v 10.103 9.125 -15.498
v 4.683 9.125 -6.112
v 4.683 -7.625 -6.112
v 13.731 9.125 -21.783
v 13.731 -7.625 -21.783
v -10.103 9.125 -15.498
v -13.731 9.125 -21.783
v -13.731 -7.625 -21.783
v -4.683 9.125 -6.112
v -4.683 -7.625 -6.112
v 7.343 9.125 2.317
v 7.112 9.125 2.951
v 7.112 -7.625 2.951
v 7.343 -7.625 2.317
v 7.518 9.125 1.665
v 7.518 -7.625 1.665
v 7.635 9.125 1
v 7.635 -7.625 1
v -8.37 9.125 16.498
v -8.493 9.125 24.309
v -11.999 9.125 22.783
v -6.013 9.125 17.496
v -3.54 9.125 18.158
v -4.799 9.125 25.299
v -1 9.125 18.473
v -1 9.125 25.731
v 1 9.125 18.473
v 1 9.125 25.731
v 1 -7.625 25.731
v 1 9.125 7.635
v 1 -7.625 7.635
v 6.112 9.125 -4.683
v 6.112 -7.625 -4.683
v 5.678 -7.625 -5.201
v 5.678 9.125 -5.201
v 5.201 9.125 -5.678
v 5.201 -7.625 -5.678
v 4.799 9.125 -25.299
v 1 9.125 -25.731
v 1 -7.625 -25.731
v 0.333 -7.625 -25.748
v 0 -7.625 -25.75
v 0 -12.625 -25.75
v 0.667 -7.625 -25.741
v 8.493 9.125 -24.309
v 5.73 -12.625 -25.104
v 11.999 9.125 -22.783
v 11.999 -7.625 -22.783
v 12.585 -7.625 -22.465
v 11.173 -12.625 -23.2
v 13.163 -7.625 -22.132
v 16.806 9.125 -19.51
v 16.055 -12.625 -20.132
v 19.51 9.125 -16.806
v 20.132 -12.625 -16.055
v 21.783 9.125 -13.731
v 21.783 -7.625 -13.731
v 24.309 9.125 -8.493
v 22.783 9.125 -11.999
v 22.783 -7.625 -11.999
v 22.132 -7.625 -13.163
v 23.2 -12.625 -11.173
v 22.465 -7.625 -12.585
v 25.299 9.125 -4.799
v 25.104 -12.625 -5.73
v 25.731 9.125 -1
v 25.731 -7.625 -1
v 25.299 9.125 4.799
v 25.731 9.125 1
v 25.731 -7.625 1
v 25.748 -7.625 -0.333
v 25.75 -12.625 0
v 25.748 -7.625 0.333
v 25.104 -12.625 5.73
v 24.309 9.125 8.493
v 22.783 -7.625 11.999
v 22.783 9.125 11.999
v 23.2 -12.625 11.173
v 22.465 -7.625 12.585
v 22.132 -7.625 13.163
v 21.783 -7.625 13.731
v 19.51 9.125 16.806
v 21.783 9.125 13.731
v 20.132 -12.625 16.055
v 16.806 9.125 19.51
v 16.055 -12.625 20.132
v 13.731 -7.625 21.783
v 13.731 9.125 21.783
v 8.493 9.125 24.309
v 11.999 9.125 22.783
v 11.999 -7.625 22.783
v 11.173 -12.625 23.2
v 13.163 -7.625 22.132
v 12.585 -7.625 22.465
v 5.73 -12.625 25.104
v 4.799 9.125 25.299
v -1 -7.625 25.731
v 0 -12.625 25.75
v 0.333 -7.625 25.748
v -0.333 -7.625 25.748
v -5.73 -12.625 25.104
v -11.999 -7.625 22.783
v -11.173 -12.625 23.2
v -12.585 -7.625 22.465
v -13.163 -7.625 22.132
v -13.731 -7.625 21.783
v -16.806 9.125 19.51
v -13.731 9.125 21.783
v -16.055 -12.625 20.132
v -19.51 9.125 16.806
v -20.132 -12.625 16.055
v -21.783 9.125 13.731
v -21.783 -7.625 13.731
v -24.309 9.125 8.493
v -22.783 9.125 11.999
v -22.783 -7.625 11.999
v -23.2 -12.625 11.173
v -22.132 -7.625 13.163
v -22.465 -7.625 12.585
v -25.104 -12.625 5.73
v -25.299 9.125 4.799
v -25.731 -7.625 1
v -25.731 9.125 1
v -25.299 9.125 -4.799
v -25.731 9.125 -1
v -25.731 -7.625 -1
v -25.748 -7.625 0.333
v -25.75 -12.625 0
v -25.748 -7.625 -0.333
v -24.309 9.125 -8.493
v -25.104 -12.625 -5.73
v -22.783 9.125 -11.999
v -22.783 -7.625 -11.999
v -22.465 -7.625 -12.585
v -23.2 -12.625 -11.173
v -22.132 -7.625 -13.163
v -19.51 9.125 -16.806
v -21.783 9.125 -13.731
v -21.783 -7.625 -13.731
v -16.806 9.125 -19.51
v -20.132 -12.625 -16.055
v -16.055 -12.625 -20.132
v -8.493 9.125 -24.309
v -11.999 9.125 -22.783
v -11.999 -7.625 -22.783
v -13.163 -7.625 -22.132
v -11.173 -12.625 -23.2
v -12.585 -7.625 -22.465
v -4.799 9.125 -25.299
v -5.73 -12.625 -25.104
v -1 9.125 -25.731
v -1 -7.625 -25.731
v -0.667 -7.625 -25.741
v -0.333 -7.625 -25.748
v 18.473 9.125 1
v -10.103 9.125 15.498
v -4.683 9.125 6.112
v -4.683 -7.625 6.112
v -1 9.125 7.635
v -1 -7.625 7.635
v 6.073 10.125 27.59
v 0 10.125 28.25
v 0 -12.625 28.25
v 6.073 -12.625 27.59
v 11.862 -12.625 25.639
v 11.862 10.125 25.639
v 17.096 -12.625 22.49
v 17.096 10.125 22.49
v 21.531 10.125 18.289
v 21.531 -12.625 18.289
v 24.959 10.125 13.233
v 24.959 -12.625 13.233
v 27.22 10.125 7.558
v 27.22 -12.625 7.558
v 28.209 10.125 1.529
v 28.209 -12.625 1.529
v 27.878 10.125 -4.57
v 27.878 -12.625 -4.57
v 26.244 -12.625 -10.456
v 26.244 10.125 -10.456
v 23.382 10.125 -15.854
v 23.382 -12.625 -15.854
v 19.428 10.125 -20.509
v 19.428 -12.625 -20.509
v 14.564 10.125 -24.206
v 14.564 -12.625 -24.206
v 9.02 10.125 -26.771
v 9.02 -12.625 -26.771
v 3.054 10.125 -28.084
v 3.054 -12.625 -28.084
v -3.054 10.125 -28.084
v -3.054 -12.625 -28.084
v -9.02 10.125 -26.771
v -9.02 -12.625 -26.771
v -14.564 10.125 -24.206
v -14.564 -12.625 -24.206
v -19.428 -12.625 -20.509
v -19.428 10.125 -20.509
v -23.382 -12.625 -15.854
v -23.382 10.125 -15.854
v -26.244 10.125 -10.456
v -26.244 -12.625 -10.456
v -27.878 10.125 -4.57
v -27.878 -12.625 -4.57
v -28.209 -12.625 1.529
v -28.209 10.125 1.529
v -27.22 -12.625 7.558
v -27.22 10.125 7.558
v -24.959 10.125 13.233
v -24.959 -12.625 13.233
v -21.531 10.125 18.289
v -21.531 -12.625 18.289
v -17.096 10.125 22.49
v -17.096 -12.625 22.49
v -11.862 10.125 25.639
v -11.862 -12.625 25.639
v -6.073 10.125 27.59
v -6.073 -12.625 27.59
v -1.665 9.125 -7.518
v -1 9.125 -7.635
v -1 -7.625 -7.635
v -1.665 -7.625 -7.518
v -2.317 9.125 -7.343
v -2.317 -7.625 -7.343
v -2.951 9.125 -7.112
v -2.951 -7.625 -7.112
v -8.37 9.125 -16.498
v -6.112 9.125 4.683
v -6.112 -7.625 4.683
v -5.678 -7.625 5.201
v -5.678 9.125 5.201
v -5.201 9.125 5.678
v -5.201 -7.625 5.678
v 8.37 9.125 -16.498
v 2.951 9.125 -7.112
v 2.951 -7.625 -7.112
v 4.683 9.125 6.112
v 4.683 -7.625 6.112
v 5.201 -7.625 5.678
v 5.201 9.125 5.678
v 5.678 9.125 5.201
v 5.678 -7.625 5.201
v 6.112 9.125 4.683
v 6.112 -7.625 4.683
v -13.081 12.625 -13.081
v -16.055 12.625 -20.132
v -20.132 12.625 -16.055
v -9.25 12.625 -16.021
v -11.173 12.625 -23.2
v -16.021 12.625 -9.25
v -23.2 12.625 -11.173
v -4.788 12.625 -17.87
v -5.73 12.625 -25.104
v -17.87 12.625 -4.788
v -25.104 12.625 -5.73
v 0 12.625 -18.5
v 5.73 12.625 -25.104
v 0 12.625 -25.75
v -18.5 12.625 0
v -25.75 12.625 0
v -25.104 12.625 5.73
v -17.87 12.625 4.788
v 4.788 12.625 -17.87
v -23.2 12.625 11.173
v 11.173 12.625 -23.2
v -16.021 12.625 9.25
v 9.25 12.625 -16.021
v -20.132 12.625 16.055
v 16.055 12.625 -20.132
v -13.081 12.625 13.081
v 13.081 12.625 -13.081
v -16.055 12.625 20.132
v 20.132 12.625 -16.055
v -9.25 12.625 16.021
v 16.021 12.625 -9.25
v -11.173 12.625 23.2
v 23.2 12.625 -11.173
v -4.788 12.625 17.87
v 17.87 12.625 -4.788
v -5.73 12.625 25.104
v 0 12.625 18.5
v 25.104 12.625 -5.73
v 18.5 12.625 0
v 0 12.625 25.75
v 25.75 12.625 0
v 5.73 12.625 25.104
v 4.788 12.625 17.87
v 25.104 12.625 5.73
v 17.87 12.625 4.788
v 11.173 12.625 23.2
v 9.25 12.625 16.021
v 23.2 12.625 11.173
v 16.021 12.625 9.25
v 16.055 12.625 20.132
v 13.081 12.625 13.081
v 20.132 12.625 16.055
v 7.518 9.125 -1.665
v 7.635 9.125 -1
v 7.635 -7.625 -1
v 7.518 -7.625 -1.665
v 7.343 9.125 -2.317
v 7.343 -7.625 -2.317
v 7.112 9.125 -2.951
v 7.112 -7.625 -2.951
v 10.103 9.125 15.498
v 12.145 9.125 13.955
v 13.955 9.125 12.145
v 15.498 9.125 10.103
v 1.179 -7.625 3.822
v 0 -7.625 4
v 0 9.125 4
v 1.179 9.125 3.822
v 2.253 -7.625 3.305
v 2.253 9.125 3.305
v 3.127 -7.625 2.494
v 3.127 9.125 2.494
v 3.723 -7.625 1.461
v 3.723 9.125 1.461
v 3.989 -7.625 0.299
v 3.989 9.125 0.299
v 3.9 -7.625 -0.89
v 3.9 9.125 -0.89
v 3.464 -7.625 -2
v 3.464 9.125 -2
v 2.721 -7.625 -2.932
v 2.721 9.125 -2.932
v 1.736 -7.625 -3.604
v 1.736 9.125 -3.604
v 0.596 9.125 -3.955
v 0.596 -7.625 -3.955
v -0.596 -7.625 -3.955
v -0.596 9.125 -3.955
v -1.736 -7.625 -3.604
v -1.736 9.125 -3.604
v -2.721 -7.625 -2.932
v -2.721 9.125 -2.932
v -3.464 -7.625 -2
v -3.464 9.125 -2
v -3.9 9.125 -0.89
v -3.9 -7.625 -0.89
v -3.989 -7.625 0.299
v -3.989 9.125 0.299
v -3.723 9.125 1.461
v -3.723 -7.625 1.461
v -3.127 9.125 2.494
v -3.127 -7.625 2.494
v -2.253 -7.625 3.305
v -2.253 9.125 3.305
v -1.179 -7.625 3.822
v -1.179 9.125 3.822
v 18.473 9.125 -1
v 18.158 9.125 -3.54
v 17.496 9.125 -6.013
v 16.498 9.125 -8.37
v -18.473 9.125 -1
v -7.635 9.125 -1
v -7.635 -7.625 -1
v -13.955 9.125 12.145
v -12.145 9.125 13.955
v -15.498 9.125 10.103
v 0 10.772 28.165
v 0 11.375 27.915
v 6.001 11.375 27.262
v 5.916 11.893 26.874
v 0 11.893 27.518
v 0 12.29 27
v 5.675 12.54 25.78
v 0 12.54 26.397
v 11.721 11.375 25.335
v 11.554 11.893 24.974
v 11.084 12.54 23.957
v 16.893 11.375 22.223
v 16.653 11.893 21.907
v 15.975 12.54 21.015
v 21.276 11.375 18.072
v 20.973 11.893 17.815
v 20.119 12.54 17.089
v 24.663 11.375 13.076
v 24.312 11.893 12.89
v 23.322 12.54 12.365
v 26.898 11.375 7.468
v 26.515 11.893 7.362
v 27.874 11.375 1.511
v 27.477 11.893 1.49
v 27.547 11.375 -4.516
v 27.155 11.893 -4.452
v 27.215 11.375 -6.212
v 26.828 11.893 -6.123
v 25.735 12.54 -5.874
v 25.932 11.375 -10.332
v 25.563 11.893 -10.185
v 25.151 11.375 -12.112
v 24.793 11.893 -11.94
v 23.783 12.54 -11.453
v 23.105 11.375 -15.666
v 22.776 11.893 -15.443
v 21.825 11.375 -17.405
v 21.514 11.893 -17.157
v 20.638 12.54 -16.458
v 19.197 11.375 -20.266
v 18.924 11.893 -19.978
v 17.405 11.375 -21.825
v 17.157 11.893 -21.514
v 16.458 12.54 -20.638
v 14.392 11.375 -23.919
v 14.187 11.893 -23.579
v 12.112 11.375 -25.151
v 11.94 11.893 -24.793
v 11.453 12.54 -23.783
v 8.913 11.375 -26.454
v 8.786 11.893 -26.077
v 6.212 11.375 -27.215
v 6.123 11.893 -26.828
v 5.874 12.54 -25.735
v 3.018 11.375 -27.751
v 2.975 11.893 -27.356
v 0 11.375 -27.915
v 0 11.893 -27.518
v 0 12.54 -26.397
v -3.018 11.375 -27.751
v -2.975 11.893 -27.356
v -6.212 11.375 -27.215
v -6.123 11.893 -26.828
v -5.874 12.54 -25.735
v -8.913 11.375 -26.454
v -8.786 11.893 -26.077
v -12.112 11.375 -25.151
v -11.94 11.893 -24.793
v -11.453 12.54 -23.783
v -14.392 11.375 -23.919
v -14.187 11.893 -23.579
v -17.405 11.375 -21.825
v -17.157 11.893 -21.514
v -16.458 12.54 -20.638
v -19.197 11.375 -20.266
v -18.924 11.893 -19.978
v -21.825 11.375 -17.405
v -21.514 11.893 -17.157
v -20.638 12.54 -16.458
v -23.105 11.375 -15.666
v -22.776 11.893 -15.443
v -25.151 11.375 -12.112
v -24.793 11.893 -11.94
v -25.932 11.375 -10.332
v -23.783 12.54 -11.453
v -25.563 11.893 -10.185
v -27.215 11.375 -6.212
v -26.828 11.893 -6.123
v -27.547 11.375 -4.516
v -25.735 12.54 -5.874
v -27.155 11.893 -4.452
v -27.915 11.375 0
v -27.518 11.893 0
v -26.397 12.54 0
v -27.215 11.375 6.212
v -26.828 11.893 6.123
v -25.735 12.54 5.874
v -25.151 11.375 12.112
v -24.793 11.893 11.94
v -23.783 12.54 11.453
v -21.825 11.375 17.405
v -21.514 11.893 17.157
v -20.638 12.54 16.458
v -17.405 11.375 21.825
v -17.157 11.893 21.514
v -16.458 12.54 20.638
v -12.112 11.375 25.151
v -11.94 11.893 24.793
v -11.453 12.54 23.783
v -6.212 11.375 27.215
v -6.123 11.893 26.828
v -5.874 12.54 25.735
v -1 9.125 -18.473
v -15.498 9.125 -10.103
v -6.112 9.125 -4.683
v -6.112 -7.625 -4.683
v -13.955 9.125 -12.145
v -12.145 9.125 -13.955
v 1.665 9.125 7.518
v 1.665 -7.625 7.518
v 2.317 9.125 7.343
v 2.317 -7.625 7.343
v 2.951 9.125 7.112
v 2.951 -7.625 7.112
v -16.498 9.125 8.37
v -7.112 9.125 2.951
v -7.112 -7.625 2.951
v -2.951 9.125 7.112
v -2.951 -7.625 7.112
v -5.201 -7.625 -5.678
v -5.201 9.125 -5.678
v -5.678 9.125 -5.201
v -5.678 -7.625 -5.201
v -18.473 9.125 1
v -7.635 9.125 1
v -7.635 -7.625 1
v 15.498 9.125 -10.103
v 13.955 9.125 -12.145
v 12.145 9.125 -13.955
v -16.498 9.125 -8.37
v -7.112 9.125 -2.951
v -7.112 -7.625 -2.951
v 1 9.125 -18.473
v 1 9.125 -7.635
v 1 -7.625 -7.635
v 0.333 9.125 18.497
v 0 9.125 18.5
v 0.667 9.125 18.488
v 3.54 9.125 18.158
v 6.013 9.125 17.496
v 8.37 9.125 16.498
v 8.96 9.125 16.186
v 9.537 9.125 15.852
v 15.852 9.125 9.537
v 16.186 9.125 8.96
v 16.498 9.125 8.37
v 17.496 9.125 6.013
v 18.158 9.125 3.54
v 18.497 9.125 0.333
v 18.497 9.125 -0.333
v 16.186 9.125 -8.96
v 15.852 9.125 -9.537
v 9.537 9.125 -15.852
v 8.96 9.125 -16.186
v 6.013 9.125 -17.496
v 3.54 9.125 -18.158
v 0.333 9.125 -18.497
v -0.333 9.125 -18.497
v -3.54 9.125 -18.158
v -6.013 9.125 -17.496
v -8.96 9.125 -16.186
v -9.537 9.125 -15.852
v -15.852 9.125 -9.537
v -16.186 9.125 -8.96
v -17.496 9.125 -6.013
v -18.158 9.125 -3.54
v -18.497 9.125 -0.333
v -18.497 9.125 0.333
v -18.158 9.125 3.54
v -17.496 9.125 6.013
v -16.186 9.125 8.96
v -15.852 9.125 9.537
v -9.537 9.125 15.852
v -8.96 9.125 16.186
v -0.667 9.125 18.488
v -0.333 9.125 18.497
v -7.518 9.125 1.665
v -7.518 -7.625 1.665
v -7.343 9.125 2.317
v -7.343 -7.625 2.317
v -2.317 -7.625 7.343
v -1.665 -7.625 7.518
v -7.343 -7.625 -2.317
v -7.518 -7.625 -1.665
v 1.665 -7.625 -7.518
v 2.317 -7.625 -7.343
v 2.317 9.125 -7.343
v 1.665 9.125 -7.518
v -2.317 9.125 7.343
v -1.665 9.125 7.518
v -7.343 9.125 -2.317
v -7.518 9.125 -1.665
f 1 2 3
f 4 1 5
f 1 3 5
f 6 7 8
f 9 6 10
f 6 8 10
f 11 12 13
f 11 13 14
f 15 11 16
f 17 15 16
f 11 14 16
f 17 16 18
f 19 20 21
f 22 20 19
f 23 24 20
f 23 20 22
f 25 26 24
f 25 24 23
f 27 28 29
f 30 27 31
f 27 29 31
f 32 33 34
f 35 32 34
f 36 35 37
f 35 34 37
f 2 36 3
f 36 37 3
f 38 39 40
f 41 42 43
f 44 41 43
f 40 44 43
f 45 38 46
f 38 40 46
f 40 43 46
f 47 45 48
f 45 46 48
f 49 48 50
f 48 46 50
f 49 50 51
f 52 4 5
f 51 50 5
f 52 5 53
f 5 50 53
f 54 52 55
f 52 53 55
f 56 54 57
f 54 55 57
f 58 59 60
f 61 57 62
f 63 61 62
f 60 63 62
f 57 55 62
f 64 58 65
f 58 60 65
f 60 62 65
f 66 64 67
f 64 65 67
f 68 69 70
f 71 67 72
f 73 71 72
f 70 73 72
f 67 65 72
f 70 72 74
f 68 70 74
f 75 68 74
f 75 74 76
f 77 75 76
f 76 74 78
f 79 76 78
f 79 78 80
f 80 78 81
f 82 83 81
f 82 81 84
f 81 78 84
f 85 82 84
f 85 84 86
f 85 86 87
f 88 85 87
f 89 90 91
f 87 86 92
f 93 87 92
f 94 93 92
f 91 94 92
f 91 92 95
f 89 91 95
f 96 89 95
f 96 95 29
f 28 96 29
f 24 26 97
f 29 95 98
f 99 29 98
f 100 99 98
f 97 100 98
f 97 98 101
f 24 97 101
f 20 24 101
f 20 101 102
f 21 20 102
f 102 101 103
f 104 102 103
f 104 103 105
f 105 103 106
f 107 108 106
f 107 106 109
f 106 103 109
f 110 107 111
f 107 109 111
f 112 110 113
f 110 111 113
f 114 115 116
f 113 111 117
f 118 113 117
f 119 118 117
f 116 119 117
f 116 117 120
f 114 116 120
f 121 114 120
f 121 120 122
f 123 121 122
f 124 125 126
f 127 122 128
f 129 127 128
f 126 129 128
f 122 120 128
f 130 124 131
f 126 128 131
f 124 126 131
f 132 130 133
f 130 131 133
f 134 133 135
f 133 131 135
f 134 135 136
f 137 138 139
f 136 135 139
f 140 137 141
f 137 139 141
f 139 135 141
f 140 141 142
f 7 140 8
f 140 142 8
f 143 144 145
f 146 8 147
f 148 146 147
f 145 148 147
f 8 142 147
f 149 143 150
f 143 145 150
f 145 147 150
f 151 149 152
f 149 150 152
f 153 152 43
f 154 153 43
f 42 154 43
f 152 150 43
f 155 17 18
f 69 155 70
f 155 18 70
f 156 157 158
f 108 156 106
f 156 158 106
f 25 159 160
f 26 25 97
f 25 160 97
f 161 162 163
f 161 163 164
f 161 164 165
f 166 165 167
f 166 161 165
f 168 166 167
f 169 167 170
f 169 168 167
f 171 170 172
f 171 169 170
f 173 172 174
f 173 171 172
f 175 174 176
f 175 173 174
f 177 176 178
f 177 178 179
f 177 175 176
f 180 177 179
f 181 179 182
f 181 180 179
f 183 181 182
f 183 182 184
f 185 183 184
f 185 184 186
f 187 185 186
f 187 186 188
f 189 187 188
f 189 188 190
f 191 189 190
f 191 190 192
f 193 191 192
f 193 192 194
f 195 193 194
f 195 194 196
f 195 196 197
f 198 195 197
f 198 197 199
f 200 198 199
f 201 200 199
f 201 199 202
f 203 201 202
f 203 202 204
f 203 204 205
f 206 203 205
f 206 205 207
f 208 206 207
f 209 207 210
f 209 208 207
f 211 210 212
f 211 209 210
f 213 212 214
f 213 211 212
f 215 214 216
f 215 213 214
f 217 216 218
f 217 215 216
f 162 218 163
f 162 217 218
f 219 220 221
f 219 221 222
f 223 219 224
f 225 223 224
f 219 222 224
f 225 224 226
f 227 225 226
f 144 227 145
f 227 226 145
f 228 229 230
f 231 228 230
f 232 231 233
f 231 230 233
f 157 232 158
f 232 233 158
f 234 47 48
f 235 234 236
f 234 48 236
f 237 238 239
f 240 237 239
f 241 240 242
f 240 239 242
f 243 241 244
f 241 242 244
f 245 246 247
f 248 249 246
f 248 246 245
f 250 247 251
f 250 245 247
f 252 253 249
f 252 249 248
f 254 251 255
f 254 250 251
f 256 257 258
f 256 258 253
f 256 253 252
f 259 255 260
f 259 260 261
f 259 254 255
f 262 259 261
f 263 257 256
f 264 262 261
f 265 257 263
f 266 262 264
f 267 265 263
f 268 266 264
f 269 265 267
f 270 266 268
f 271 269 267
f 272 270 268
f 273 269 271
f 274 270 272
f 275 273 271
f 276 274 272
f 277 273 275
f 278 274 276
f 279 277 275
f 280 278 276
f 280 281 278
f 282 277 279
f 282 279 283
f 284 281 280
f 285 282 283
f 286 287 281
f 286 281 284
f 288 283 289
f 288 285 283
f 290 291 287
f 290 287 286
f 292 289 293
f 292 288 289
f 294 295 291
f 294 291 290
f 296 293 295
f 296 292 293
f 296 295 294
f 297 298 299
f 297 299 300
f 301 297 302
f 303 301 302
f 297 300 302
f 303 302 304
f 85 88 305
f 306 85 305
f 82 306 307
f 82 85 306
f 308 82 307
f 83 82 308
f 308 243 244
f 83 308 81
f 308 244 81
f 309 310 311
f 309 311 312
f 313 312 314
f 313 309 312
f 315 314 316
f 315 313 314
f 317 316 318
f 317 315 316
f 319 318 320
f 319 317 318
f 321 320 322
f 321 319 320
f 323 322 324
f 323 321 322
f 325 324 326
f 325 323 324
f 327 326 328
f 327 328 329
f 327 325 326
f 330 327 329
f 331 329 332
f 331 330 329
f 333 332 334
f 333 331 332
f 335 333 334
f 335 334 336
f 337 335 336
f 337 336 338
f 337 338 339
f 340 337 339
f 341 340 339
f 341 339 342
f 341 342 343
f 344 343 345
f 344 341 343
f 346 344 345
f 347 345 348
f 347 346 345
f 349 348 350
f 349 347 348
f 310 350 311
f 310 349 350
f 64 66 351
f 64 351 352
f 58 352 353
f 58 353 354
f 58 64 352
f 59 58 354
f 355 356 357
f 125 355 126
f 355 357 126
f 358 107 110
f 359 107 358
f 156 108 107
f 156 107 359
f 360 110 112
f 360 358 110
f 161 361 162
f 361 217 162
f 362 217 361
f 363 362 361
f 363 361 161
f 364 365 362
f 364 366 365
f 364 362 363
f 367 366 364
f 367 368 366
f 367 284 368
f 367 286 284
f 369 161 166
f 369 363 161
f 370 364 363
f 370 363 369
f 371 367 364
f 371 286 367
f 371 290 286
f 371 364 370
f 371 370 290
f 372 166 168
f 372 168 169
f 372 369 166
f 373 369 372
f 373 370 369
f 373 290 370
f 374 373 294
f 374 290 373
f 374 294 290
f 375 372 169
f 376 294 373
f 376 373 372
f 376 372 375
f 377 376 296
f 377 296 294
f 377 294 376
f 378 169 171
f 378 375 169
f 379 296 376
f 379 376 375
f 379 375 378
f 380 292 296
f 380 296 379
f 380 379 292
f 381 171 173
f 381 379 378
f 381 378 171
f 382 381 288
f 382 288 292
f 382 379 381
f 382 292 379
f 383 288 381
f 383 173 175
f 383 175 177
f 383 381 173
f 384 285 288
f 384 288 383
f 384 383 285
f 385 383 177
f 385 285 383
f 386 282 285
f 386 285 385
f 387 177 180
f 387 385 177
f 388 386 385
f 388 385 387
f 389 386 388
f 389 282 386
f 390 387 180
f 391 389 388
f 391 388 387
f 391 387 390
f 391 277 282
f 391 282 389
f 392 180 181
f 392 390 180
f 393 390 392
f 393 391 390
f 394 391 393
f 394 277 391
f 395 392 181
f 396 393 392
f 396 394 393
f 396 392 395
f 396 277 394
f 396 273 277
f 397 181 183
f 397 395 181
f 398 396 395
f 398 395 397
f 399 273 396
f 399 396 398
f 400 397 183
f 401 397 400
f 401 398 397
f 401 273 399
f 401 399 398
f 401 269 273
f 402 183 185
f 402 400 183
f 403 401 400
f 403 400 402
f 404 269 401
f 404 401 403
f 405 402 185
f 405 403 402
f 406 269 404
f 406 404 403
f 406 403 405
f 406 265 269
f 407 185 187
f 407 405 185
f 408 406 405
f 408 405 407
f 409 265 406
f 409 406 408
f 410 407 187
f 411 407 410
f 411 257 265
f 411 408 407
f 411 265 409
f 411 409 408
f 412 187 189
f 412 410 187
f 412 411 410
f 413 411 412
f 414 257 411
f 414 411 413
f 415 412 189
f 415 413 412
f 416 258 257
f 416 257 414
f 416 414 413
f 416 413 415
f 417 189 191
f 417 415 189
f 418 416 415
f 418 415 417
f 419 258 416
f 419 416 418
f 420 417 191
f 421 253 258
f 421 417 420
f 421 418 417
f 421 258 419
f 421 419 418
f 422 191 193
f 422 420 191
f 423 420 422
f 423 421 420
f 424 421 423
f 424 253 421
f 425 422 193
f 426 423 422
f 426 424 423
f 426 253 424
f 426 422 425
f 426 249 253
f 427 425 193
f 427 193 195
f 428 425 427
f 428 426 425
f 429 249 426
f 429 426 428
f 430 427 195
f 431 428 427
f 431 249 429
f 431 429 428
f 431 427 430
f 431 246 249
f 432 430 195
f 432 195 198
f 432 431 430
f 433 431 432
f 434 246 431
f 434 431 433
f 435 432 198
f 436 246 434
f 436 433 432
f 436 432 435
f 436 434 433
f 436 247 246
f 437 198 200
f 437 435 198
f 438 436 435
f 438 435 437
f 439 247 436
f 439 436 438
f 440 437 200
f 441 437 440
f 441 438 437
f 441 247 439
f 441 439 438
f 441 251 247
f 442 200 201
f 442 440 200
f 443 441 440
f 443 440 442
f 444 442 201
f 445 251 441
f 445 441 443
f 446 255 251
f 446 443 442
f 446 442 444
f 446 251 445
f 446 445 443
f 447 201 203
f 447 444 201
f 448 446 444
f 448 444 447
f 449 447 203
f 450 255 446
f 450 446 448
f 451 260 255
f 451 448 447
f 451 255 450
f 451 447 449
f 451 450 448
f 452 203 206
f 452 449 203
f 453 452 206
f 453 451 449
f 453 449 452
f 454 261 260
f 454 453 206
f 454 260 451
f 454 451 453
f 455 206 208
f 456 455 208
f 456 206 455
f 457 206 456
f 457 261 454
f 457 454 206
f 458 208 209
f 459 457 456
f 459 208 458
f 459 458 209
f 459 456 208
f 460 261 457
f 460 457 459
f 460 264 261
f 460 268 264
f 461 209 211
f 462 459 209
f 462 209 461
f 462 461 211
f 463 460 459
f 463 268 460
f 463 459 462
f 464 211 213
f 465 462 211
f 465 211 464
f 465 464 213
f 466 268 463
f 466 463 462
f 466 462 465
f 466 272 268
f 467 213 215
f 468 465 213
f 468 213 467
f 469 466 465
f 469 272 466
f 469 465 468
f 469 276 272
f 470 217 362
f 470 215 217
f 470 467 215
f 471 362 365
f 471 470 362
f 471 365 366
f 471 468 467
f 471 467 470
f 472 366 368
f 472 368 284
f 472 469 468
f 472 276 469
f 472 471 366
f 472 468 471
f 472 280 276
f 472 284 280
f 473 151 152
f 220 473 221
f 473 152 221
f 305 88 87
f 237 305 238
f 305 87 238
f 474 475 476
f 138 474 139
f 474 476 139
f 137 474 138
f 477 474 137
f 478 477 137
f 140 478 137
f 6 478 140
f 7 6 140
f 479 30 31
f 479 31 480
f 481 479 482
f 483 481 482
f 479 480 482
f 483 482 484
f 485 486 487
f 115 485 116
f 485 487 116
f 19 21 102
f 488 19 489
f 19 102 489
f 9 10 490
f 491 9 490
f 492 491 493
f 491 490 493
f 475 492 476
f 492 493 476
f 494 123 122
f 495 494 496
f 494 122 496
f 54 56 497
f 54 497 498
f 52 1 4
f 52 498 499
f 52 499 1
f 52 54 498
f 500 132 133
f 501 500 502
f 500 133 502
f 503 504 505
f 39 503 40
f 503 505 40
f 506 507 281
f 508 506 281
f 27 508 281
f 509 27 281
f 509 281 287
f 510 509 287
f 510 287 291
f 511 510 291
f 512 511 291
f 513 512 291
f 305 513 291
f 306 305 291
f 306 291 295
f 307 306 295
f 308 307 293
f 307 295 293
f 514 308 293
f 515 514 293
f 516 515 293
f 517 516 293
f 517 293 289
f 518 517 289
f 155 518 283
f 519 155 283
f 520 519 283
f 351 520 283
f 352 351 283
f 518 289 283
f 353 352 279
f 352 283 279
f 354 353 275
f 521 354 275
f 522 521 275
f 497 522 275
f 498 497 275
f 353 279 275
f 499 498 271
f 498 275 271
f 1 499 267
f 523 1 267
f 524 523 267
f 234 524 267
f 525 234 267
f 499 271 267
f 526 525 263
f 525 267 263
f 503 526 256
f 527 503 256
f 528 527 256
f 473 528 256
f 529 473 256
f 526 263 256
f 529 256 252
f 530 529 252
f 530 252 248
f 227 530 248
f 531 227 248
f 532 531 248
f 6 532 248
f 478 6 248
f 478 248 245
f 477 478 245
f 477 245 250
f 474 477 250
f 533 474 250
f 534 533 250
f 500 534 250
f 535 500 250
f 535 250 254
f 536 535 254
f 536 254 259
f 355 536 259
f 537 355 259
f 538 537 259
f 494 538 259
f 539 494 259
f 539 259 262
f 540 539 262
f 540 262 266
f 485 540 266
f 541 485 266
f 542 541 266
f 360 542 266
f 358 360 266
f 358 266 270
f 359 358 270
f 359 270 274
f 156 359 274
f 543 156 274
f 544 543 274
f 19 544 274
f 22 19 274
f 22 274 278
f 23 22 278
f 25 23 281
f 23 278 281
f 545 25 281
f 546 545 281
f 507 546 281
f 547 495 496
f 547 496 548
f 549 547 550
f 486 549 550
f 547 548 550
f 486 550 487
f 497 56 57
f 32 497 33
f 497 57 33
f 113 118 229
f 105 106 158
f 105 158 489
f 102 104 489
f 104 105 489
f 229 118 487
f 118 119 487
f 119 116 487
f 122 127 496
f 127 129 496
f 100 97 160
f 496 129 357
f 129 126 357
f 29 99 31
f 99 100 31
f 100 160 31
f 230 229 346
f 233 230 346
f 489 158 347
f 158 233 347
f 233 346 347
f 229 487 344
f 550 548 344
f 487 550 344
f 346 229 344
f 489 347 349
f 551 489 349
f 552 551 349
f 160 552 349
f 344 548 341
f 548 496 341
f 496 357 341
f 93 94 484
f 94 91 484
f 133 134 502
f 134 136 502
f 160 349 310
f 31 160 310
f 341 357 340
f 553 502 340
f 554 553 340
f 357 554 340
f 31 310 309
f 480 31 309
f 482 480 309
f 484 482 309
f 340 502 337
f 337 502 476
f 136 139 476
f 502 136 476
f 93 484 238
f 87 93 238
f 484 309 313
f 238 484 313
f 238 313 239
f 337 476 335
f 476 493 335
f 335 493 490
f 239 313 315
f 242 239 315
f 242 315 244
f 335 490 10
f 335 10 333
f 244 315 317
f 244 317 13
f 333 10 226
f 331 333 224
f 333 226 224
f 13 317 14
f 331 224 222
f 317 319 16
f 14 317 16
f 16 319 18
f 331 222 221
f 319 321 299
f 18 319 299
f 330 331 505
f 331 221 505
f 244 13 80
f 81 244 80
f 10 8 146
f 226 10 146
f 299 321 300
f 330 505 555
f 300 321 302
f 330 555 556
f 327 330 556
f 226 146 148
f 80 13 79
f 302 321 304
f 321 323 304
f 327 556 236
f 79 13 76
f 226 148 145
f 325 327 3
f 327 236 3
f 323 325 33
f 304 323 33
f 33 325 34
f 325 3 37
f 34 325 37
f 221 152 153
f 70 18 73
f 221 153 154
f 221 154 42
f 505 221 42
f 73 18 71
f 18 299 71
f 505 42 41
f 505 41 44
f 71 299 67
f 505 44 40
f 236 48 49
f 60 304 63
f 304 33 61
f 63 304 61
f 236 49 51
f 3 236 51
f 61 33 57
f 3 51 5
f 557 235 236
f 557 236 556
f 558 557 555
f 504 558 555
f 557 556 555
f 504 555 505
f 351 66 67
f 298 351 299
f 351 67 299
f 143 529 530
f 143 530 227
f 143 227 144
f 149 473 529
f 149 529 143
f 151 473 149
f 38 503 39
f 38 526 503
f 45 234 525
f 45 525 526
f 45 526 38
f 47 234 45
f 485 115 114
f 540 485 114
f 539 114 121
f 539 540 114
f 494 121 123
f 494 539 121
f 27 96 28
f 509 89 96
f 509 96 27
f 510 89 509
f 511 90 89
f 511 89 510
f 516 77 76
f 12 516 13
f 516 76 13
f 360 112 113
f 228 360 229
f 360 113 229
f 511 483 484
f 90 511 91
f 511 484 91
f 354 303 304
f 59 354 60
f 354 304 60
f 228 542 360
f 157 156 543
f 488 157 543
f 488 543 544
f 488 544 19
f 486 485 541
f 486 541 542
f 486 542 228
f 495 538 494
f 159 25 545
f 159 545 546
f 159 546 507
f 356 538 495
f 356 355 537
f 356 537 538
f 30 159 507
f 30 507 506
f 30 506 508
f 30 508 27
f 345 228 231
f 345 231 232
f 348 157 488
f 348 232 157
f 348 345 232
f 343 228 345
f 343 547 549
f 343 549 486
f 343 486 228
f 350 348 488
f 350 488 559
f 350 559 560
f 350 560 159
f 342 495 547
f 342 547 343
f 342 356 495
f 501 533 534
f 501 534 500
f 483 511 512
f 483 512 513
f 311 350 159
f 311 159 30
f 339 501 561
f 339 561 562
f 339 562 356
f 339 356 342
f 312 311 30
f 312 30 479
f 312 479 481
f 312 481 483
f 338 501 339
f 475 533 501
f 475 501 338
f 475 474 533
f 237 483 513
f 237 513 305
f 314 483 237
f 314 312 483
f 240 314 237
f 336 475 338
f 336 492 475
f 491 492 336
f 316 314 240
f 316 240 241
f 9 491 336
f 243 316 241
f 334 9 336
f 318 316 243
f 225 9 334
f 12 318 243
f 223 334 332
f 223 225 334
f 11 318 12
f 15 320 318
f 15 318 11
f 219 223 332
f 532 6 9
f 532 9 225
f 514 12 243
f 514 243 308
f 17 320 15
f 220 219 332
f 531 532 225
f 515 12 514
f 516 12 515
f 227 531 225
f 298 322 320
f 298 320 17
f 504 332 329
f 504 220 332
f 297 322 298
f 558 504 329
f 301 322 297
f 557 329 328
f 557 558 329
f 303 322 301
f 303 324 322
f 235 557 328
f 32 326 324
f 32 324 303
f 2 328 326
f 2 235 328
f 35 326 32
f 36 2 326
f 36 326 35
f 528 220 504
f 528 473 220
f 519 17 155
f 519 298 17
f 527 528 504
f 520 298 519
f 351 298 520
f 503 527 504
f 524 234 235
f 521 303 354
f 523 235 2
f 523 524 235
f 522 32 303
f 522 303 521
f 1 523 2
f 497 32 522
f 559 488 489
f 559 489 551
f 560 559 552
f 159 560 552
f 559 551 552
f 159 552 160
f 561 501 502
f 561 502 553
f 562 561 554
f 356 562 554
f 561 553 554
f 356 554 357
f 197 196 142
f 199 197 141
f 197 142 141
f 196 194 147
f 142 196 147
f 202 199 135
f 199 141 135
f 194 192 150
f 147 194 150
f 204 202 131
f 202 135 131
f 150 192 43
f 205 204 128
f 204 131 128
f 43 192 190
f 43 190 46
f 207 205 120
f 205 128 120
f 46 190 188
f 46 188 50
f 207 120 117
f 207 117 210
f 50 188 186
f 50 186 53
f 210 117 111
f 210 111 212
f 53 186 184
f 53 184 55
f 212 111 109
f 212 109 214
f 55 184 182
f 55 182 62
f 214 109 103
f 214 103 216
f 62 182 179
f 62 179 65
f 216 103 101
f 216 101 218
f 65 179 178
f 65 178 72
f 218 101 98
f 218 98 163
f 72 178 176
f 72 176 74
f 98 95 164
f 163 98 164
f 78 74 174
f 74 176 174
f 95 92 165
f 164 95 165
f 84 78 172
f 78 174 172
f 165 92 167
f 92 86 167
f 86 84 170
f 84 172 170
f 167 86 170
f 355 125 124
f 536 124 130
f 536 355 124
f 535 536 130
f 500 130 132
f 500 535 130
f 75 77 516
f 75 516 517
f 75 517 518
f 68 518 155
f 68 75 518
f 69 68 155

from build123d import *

# Parameters (mm, degrees)
ESBO_O1_R                     = 28.25
RESSALTO_EXTRUS_O1_DEPTH      = 12.625
ESBO_O2_R                     = 18.5
CORTE_EXTRUS_O1_DEPTH         = 3.5
ESBO_O3_R                     = 25.75
CORTE_EXTRUS_O2_DEPTH         = 21.75
RESSALTO_EXTRUS_O2_DEPTH      = 9.125
RESSALTO_EXTRUS_O2_DEPTH_BACK = 7.625
ESBO_O4_R                     = 4
FILETE1_R                     = 2.5


with BuildPart() as part:
    # Esboço1 → Ressalto-extrusão1 (new, symmetric)
    with BuildSketch(Plane(origin=(0, 0, 0), x_dir=(1, 0, 0), z_dir=(0, 1, 0))):
        with Locations(Location((0, 0, 0), (0, 0, 270))):
            Circle(ESBO_O1_R)
    extrude(amount=RESSALTO_EXTRUS_O1_DEPTH, both=True)

    # Esboço2 → Corte-extrusão1 (cut)
    with BuildSketch(Plane(origin=(0, 12.625, 0), x_dir=(1, 0, 0), z_dir=(0, 1, 0))):
        with Locations(Location((0, 0, 0), (0, 0, 270))):
            Circle(ESBO_O2_R)
    extrude(amount=-CORTE_EXTRUS_O1_DEPTH, mode=Mode.SUBTRACT)

    # Esboço3 → Corte-extrusão2 (cut)
    with BuildSketch(Plane.XZ.offset(12.625)):
        with Locations(Location((0, 0, 0), (0, 0, 270))):
            Circle(ESBO_O3_R)
    extrude(amount=-CORTE_EXTRUS_O2_DEPTH, mode=Mode.SUBTRACT)

    # Esboço4 → Ressalto-extrusão2 (add, two sides: drawn at the far end of the back side and taken through both)
    with BuildSketch(Plane(origin=(0, 0, 0), x_dir=(1, 0, 0), z_dir=(0, 1, 0)).offset(-RESSALTO_EXTRUS_O2_DEPTH_BACK)):
        with BuildLine():
            Line((4.683419803, 6.111921052), (13.741025404, 21.800154147))
            ThreePointArc((13.741025404, 21.800154147), (12.88470508, 22.316963839), (12.008974596, 22.800154147))
            Line((12.008974596, 22.800154147), (2.951368996, 7.111921052))
            ThreePointArc((2.951368996, 7.111921052), (1.992906647, 7.437628862), (1, 7.634788799))
            Line((1, 7.634788799), (1, 25.75))
            ThreePointArc((1, 25.75), (0, 25.76941016), (-1, 25.75))
            Line((-1, 25.75), (-1, 7.634788799))
            ThreePointArc((-1, 7.634788799), (-1.992906647, 7.437628862), (-2.951368996, 7.111921052))
            Line((-2.951368996, 7.111921052), (-12.008974596, 22.800154147))
            ThreePointArc((-12.008974596, 22.800154147), (-12.88470508, 22.316963839), (-13.741025404, 21.800154147))
            Line((-13.741025404, 21.800154147), (-4.683419803, 6.111921052))
            ThreePointArc((-4.683419803, 6.111921052), (-5.444722215, 5.444722215), (-6.111921052, 4.683419803))
            Line((-6.111921052, 4.683419803), (-21.800154147, 13.741025404))
            ThreePointArc((-21.800154147, 13.741025404), (-22.316963839, 12.88470508), (-22.800154147, 12.008974596))
            Line((-22.800154147, 12.008974596), (-7.111921052, 2.951368996))
            ThreePointArc((-7.111921052, 2.951368996), (-7.437628862, 1.992906647), (-7.634788799, 1))
            Line((-7.634788799, 1), (-25.75, 1))
            ThreePointArc((-25.75, 1), (-25.76941016, 0), (-25.75, -1))
            Line((-25.75, -1), (-7.634788799, -1))
            ThreePointArc((-7.634788799, -1), (-7.437628862, -1.992906647), (-7.111921052, -2.951368996))
            Line((-7.111921052, -2.951368996), (-22.800154147, -12.008974596))
            ThreePointArc((-22.800154147, -12.008974596), (-22.316963839, -12.88470508), (-21.800154147, -13.741025404))
            Line((-21.800154147, -13.741025404), (-6.111921052, -4.683419803))
            ThreePointArc((-6.111921052, -4.683419803), (-5.444722215, -5.444722215), (-4.683419803, -6.111921052))
            Line((-4.683419803, -6.111921052), (-13.741025404, -21.800154147))
            ThreePointArc((-13.741025404, -21.800154147), (-12.88470508, -22.316963839), (-12.008974596, -22.800154147))
            Line((-12.008974596, -22.800154147), (-2.951368996, -7.111921052))
            ThreePointArc((-2.951368996, -7.111921052), (-1.992906647, -7.437628862), (-1, -7.634788799))
            Line((-1, -7.634788799), (-1, -25.75))
            ThreePointArc((-1, -25.75), (0, -25.76941016), (1, -25.75))
            Line((1, -25.75), (1, -7.634788799))
            ThreePointArc((1, -7.634788799), (1.992906647, -7.437628862), (2.951368996, -7.111921052))
            Line((2.951368996, -7.111921052), (12.008974596, -22.800154147))
            ThreePointArc((12.008974596, -22.800154147), (12.88470508, -22.316963839), (13.741025404, -21.800154147))
            Line((13.741025404, -21.800154147), (4.683419803, -6.111921052))
            ThreePointArc((4.683419803, -6.111921052), (5.444722215, -5.444722215), (6.111921052, -4.683419803))
            Line((6.111921052, -4.683419803), (21.800154147, -13.741025404))
            ThreePointArc((21.800154147, -13.741025404), (22.316963839, -12.88470508), (22.800154147, -12.008974596))
            Line((22.800154147, -12.008974596), (7.111921052, -2.951368996))
            ThreePointArc((7.111921052, -2.951368996), (7.437628862, -1.992906647), (7.634788799, -1))
            Line((7.634788799, -1), (25.75, -1))
            ThreePointArc((25.75, -1), (25.76941016, 0), (25.75, 1))
            Line((25.75, 1), (7.634788799, 1))
            ThreePointArc((7.634788799, 1), (7.437628862, 1.992906647), (7.111921052, 2.951368996))
            Line((7.111921052, 2.951368996), (22.800154147, 12.008974596))
            ThreePointArc((22.800154147, 12.008974596), (22.316963839, 12.88470508), (21.800154147, 13.741025404))
            Line((21.800154147, 13.741025404), (6.111921052, 4.683419803))
            ThreePointArc((6.111921052, 4.683419803), (5.444722215, 5.444722215), (4.683419803, 6.111921052))
        make_face()
        with Locations(Location((0, 0, 0), (0, 0, 270))):
            Circle(ESBO_O4_R, mode=Mode.SUBTRACT)
    extrude(amount=RESSALTO_EXTRUS_O2_DEPTH + RESSALTO_EXTRUS_O2_DEPTH_BACK)

    # Filete1
    filete1_edges = [part.edges().sort_by_distance(p)[0] for p in [
        (0, 12.625, -28.25),
    ]]
    fillet(filete1_edges, radius=FILETE1_R)


solid = part.part
